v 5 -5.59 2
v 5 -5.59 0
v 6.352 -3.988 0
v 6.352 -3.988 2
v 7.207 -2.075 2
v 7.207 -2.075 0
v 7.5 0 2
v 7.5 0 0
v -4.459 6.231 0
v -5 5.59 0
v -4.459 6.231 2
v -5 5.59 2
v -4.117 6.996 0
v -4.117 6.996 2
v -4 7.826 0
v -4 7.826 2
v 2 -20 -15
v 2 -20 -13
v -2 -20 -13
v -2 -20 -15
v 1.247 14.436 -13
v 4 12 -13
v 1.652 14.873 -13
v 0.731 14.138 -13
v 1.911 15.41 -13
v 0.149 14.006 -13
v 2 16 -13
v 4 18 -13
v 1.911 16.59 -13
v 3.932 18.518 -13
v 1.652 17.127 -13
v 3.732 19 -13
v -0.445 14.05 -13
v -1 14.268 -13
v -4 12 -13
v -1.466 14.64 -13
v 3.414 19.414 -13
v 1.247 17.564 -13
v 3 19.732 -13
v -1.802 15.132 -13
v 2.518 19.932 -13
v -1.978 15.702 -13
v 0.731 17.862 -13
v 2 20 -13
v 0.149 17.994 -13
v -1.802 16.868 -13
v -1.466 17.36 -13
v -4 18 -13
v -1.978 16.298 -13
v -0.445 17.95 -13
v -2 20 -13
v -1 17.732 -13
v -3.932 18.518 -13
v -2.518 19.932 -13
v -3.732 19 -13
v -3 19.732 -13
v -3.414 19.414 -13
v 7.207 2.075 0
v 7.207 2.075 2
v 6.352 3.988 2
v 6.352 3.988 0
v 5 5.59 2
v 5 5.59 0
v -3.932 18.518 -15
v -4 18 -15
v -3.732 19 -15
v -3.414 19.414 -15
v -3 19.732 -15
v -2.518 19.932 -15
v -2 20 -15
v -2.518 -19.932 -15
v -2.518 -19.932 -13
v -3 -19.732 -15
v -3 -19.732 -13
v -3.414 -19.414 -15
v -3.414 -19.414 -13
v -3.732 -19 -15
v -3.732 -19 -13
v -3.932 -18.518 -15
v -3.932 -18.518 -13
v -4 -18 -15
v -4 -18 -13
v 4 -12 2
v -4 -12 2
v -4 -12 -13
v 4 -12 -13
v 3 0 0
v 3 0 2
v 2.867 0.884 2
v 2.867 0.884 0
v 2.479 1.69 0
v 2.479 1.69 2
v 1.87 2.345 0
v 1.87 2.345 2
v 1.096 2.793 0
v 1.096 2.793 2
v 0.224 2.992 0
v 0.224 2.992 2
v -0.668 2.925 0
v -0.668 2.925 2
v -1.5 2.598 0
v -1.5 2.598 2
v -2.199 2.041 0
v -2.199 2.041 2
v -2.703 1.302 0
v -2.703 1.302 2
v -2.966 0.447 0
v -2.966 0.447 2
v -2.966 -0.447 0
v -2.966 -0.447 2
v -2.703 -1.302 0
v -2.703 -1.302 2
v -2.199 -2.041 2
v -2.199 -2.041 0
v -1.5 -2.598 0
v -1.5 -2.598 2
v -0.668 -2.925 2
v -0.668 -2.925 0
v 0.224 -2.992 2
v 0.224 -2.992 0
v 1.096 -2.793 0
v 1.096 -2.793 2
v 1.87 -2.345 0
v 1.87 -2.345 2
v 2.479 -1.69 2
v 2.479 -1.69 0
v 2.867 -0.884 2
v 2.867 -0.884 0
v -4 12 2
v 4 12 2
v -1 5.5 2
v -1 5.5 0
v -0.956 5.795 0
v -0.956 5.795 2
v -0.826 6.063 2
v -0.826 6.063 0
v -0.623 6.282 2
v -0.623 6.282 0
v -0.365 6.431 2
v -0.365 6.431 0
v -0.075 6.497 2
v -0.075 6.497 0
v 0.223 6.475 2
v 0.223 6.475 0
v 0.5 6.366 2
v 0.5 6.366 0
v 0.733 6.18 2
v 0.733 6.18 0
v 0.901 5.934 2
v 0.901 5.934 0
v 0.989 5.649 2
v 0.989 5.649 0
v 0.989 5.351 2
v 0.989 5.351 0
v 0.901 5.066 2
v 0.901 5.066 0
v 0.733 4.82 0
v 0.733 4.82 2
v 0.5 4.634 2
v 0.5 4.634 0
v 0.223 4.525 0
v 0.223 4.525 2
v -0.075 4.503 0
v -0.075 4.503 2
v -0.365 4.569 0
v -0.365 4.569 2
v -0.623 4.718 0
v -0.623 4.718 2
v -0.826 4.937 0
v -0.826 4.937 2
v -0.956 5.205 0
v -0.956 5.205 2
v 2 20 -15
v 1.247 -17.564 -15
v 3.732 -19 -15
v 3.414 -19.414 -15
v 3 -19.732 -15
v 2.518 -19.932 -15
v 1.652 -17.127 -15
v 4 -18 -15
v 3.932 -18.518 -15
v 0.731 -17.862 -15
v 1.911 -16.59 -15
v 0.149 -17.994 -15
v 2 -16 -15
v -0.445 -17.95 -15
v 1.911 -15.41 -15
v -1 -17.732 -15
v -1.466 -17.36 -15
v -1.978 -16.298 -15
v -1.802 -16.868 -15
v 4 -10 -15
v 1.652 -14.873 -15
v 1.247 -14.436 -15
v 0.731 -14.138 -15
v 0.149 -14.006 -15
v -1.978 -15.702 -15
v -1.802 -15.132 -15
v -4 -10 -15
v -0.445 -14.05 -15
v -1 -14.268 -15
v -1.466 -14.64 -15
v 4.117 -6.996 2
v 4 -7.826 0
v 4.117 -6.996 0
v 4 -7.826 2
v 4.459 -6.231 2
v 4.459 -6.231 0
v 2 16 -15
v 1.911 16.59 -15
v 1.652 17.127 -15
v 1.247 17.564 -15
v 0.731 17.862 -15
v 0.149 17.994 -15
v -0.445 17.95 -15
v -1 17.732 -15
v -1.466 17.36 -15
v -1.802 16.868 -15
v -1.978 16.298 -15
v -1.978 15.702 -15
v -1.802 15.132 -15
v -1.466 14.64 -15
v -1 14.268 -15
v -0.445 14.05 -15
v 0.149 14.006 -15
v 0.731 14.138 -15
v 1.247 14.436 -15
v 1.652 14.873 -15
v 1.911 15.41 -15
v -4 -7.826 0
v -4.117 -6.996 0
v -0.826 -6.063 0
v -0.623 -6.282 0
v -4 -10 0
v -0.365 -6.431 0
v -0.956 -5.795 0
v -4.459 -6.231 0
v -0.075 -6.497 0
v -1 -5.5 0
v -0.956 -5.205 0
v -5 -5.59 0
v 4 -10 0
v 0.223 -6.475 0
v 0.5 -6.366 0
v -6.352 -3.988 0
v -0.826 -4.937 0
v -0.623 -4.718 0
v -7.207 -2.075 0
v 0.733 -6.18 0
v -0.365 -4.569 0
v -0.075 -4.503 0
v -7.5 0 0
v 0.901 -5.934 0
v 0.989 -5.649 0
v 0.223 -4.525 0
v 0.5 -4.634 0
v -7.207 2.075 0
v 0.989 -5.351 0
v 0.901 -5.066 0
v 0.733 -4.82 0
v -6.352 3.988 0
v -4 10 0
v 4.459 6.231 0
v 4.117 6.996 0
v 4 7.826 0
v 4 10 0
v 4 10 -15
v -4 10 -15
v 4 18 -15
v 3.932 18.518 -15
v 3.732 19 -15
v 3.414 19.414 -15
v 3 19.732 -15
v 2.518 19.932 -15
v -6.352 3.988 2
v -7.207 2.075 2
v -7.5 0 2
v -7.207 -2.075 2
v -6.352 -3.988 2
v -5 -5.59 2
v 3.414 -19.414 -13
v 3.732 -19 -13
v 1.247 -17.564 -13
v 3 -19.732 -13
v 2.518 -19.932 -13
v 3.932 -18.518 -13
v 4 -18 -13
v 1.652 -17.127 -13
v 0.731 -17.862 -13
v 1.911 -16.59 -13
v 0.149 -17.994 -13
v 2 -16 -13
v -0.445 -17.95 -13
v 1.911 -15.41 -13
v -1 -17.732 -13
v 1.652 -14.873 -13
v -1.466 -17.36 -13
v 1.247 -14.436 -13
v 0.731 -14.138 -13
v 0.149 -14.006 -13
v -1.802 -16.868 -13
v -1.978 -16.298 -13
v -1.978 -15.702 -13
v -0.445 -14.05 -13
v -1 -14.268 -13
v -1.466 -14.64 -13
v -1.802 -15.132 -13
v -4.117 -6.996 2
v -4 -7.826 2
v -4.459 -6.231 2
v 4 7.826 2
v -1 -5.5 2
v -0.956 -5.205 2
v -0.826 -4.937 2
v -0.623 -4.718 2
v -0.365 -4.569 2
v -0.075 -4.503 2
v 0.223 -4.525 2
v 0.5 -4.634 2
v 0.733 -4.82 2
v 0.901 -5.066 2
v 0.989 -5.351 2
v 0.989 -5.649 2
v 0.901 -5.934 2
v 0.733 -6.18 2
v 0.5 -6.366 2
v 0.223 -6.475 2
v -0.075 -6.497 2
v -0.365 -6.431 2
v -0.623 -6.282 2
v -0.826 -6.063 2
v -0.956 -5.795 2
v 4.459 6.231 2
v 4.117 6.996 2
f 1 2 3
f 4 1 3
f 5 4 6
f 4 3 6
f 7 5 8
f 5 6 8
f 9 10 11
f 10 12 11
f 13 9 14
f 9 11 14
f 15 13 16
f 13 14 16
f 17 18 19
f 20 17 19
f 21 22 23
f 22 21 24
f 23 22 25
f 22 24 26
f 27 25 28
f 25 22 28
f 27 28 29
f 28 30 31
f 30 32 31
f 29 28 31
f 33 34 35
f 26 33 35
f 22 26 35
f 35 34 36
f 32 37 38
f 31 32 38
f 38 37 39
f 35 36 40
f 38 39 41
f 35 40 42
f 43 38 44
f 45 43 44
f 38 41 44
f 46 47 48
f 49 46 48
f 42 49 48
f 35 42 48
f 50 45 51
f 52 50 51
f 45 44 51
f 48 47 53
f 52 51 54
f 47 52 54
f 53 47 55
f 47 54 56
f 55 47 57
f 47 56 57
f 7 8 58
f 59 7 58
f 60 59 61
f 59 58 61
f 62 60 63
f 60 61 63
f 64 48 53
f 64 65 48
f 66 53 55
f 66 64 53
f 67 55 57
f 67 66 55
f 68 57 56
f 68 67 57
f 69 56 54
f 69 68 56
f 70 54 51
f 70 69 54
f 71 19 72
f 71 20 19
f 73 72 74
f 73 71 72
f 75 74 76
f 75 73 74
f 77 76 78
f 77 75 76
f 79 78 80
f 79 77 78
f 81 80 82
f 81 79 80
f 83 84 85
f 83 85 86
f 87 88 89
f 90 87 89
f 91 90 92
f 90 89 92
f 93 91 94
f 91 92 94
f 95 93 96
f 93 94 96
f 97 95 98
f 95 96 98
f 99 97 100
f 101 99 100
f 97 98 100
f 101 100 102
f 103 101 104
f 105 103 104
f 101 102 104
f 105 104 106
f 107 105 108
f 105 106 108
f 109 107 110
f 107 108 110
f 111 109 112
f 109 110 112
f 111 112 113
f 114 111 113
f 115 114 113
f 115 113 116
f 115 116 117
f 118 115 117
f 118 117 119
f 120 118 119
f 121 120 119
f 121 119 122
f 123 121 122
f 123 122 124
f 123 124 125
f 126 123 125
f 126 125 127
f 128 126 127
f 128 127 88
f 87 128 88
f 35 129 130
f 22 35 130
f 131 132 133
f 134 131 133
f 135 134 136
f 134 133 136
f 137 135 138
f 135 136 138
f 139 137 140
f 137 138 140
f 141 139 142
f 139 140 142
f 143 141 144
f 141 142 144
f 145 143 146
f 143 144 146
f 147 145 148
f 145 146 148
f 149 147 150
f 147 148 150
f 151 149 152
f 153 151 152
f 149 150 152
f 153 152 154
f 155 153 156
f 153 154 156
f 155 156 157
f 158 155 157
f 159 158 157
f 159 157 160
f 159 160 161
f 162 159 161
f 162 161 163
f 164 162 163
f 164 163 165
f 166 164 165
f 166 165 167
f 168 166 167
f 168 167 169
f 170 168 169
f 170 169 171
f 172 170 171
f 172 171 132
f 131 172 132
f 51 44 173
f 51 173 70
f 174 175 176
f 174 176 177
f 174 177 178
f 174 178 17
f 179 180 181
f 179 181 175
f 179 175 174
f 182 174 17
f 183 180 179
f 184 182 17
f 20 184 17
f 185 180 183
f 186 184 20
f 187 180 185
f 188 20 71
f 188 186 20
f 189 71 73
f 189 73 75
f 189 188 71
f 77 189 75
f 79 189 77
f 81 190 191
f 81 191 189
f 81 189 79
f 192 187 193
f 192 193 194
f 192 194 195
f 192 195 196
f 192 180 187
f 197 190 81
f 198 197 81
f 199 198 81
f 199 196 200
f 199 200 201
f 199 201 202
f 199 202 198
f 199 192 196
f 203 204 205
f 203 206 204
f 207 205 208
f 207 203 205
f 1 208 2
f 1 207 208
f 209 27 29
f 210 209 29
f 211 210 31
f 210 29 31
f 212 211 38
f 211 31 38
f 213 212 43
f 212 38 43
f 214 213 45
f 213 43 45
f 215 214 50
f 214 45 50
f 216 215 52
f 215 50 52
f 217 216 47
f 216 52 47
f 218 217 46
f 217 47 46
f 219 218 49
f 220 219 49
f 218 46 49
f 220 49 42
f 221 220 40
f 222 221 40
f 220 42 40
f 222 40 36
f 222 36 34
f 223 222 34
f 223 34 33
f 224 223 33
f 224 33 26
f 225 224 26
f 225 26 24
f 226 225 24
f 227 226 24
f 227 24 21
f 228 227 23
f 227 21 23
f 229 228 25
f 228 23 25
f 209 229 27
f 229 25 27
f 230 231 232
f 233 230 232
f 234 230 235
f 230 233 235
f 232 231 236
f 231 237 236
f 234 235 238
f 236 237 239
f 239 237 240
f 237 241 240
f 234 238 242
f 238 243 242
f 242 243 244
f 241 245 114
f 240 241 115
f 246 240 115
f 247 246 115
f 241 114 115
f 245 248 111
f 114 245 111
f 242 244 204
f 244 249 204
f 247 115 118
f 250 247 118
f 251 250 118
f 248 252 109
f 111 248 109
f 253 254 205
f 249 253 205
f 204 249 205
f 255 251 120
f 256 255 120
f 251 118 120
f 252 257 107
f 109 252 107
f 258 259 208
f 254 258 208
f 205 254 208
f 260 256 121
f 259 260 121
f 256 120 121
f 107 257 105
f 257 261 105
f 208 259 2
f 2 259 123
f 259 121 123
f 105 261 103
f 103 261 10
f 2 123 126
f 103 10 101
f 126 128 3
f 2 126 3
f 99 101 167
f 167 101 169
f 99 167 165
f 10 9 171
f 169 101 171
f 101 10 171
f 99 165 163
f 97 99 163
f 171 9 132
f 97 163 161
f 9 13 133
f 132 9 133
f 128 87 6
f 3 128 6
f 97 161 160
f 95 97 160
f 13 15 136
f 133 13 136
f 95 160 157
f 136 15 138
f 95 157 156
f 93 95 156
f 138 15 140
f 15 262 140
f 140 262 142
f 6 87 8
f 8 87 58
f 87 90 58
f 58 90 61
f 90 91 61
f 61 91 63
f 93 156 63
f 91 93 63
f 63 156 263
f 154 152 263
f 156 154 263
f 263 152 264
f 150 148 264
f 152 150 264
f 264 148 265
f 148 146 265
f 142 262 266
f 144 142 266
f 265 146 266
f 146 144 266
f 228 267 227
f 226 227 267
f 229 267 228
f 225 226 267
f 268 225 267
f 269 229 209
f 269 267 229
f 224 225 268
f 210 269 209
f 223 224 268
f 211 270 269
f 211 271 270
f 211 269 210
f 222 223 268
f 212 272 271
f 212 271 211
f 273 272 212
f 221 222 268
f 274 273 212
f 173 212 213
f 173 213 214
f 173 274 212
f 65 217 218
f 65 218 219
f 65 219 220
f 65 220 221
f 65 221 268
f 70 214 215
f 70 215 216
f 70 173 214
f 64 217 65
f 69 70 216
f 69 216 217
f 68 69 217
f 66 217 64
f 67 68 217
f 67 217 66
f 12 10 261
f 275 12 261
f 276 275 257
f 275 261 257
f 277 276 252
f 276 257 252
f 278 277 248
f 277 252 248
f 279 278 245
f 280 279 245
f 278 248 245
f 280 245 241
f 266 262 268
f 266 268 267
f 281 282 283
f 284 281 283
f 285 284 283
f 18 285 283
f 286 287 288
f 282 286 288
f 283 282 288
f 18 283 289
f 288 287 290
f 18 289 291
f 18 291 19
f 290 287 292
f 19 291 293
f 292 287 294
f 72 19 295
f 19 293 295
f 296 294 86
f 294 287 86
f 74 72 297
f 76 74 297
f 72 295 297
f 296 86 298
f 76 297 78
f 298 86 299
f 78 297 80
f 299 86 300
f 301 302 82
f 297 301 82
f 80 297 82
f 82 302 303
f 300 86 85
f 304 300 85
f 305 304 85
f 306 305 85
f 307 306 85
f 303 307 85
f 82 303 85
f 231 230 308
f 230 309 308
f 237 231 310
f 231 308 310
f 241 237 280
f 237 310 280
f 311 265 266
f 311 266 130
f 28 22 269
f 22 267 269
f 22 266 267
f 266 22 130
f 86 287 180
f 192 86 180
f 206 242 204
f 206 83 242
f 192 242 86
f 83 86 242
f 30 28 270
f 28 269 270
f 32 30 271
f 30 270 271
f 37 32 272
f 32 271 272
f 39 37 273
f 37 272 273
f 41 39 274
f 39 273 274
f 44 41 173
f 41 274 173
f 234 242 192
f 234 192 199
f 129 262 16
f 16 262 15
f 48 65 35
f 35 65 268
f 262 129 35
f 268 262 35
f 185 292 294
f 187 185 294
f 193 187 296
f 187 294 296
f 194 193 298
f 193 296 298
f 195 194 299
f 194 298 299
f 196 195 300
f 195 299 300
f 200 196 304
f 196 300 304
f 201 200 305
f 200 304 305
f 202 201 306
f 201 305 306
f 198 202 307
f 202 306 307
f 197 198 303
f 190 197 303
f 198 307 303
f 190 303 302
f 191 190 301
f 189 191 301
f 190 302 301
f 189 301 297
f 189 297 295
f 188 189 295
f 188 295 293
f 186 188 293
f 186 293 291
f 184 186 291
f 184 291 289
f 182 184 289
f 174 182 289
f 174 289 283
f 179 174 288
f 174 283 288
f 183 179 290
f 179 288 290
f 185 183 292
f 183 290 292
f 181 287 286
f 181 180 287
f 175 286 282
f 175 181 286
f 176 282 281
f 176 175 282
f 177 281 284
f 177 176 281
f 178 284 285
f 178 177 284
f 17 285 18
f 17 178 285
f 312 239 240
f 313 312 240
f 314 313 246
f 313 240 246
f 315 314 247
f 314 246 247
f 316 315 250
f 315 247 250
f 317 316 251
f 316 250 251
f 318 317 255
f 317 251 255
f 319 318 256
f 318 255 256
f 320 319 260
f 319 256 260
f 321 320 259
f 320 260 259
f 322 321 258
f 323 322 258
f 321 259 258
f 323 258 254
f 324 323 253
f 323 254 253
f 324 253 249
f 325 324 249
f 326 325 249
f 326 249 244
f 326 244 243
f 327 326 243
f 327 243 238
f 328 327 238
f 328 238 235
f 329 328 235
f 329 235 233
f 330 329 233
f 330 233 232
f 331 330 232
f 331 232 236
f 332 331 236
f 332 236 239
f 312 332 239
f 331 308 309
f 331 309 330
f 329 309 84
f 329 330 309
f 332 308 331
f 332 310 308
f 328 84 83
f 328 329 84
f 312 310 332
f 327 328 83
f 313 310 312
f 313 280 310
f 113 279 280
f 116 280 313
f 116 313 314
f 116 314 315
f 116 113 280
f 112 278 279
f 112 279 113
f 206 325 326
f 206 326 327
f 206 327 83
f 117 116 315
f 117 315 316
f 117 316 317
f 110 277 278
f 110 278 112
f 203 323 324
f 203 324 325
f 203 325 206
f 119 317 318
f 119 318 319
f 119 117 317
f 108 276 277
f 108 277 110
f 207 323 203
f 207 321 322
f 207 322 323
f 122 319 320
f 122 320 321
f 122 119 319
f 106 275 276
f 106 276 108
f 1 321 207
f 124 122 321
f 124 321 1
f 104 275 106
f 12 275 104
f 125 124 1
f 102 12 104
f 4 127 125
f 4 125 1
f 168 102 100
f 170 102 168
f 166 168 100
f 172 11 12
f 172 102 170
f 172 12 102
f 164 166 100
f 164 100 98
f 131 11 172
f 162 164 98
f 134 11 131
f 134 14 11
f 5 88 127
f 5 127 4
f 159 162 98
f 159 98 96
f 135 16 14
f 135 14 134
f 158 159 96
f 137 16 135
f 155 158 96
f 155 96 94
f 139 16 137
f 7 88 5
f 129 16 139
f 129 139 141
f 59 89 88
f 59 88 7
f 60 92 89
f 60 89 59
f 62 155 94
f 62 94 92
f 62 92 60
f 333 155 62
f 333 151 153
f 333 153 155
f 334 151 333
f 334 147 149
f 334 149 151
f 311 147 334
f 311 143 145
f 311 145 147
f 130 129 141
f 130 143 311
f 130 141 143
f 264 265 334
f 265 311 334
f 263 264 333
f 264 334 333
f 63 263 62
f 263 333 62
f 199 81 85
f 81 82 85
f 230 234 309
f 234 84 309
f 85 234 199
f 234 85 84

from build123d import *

# Parameters (mm, degrees)
SKETCH_1_R          = 2
EXTRUDE_1_DEPTH     = 2
SKETCH_4_W          = 8
SKETCH_4_H          = 2
EXTRUDE_3_DEPTH     = 15
SKETCH_5_R          = 1
CUT_EXTRUDE_1_DEPTH = 8
SKETCH_6_W          = 8
SKETCH_6_H          = 10
EXTRUDE_4_DEPTH     = 2
SKETCH_7_R          = 2
CUT_EXTRUDE_2_DEPTH = 2
FILLET_1_R          = 3
FILLET_2_R          = 2
SKETCH_9_R          = 3
CUT_EXTRUDE_3_DEPTH = 10


with BuildPart() as part:
    # 草图1 → 凸台-拉伸1 (new body)
    # profile 1 of 5: a face of its own
    with BuildSketch(Plane.XY):
        with BuildLine():
            Line((4, 6.34428877), (4, -6.34428877))
            ThreePointArc((4, -6.34428877), (6.566962768, -3.622844187), (7.5, 0))
            ThreePointArc((7.5, 0), (6.566962768, 3.622844187), (4, 6.34428877))
        make_face()
    # profile 2 of 5: a face of its own
    with BuildSketch(Plane.XY):
        with BuildLine():
            Line((-4, 6.34428877), (-4, -6.34428877))
            ThreePointArc((-4, -6.34428877), (0, -7.5), (4, -6.34428877))
            Line((4, -6.34428877), (4, 6.34428877))
            ThreePointArc((4, 6.34428877), (0, 7.5), (-4, 6.34428877))
        make_face()
        Circle(SKETCH_1_R, mode=Mode.SUBTRACT)
    # profile 3 of 5: a face of its own
    with BuildSketch(Plane.XY):
        with BuildLine():
            ThreePointArc((-4, 6.34428877), (-7.5, 0), (-4, -6.34428877))
            Line((-4, -6.34428877), (-4, 6.34428877))
        make_face()
    # profile 4 of 5: a face of its own
    with BuildSketch(Plane.XY):
        with BuildLine():
            Line((-4, 10), (-4, 6.34428877))
            ThreePointArc((-4, 6.34428877), (0, 7.5), (4, 6.34428877))
            Line((4, 6.34428877), (4, 10))
            Line((4, 10), (-4, 10))
        make_face()
    # profile 5 of 5: a face of its own
    with BuildSketch(Plane.XY):
        with BuildLine():
            Line((-4, -6.34428877), (-4, -10))
            Line((-4, -10), (4, -10))
            Line((4, -10), (4, -6.34428877))
            ThreePointArc((4, -6.34428877), (0, -7.5), (-4, -6.34428877))
        make_face()
    extrude(amount=EXTRUDE_1_DEPTH)

    # 草图4 → 凸台-拉伸3 (add)
    with BuildSketch(Plane.XY.offset(2)):
        with Locations((0, -11)):
            Rectangle(SKETCH_4_W, SKETCH_4_H)
        with Locations((0, 11)):
            Rectangle(SKETCH_4_W, SKETCH_4_H)
    extrude(amount=-EXTRUDE_3_DEPTH)

    # 草图5 → 切除-拉伸1 (cut)
    with BuildSketch(Plane(origin=(0, 0, 0), x_dir=(-1, 0, 0), z_dir=(0, 0, -1))):
        with Locations((0, 5.5)):
            Circle(SKETCH_5_R)
        with Locations((0, -5.5)):
            Circle(SKETCH_5_R)
    extrude(amount=-CUT_EXTRUDE_1_DEPTH, mode=Mode.SUBTRACT)

    # 草图6 → 凸台-拉伸4 (add)
    with BuildSketch(Plane(origin=(0, 0, -13), x_dir=(-1, 0, 0), z_dir=(0, 0, -1))):
        with Locations((0, -15)):
            Rectangle(SKETCH_6_W, SKETCH_6_H)
        with Locations((0, 15)):
            Rectangle(SKETCH_6_W, SKETCH_6_H)
    extrude(amount=EXTRUDE_4_DEPTH)

    # 草图7 → 切除-拉伸2 (cut)
    with BuildSketch(Plane.XY.offset(-13)):
        with Locations((0, 16)):
            Circle(SKETCH_7_R)
        with Locations((0, -16)):
            Circle(SKETCH_7_R)
    extrude(amount=-CUT_EXTRUDE_2_DEPTH, mode=Mode.SUBTRACT)

    # 圆角1
    fillet_1_edges = [part.edges().sort_by_distance(p)[0] for p in [
        (4, -6.34428877, 1),
        (-4, -6.34428877, 1),
        (-4, 6.34428877, 1),
        (4, 6.34428877, 1),
    ]]
    fillet(fillet_1_edges, radius=FILLET_1_R)

    # 圆角2
    fillet_2_edges = [part.edges().sort_by_distance(p)[0] for p in [
        (4, 20, -14),
        (-4, 20, -14),
        (4, -20, -14),
        (-4, -20, -14),
    ]]
    fillet(fillet_2_edges, radius=FILLET_2_R)

    # 草图9 → 切除-拉伸3 (cut)
    with BuildSketch(Plane.XY.offset(2)):
        Circle(SKETCH_9_R)
    extrude(amount=-CUT_EXTRUDE_3_DEPTH, mode=Mode.SUBTRACT)


solid = part.part
